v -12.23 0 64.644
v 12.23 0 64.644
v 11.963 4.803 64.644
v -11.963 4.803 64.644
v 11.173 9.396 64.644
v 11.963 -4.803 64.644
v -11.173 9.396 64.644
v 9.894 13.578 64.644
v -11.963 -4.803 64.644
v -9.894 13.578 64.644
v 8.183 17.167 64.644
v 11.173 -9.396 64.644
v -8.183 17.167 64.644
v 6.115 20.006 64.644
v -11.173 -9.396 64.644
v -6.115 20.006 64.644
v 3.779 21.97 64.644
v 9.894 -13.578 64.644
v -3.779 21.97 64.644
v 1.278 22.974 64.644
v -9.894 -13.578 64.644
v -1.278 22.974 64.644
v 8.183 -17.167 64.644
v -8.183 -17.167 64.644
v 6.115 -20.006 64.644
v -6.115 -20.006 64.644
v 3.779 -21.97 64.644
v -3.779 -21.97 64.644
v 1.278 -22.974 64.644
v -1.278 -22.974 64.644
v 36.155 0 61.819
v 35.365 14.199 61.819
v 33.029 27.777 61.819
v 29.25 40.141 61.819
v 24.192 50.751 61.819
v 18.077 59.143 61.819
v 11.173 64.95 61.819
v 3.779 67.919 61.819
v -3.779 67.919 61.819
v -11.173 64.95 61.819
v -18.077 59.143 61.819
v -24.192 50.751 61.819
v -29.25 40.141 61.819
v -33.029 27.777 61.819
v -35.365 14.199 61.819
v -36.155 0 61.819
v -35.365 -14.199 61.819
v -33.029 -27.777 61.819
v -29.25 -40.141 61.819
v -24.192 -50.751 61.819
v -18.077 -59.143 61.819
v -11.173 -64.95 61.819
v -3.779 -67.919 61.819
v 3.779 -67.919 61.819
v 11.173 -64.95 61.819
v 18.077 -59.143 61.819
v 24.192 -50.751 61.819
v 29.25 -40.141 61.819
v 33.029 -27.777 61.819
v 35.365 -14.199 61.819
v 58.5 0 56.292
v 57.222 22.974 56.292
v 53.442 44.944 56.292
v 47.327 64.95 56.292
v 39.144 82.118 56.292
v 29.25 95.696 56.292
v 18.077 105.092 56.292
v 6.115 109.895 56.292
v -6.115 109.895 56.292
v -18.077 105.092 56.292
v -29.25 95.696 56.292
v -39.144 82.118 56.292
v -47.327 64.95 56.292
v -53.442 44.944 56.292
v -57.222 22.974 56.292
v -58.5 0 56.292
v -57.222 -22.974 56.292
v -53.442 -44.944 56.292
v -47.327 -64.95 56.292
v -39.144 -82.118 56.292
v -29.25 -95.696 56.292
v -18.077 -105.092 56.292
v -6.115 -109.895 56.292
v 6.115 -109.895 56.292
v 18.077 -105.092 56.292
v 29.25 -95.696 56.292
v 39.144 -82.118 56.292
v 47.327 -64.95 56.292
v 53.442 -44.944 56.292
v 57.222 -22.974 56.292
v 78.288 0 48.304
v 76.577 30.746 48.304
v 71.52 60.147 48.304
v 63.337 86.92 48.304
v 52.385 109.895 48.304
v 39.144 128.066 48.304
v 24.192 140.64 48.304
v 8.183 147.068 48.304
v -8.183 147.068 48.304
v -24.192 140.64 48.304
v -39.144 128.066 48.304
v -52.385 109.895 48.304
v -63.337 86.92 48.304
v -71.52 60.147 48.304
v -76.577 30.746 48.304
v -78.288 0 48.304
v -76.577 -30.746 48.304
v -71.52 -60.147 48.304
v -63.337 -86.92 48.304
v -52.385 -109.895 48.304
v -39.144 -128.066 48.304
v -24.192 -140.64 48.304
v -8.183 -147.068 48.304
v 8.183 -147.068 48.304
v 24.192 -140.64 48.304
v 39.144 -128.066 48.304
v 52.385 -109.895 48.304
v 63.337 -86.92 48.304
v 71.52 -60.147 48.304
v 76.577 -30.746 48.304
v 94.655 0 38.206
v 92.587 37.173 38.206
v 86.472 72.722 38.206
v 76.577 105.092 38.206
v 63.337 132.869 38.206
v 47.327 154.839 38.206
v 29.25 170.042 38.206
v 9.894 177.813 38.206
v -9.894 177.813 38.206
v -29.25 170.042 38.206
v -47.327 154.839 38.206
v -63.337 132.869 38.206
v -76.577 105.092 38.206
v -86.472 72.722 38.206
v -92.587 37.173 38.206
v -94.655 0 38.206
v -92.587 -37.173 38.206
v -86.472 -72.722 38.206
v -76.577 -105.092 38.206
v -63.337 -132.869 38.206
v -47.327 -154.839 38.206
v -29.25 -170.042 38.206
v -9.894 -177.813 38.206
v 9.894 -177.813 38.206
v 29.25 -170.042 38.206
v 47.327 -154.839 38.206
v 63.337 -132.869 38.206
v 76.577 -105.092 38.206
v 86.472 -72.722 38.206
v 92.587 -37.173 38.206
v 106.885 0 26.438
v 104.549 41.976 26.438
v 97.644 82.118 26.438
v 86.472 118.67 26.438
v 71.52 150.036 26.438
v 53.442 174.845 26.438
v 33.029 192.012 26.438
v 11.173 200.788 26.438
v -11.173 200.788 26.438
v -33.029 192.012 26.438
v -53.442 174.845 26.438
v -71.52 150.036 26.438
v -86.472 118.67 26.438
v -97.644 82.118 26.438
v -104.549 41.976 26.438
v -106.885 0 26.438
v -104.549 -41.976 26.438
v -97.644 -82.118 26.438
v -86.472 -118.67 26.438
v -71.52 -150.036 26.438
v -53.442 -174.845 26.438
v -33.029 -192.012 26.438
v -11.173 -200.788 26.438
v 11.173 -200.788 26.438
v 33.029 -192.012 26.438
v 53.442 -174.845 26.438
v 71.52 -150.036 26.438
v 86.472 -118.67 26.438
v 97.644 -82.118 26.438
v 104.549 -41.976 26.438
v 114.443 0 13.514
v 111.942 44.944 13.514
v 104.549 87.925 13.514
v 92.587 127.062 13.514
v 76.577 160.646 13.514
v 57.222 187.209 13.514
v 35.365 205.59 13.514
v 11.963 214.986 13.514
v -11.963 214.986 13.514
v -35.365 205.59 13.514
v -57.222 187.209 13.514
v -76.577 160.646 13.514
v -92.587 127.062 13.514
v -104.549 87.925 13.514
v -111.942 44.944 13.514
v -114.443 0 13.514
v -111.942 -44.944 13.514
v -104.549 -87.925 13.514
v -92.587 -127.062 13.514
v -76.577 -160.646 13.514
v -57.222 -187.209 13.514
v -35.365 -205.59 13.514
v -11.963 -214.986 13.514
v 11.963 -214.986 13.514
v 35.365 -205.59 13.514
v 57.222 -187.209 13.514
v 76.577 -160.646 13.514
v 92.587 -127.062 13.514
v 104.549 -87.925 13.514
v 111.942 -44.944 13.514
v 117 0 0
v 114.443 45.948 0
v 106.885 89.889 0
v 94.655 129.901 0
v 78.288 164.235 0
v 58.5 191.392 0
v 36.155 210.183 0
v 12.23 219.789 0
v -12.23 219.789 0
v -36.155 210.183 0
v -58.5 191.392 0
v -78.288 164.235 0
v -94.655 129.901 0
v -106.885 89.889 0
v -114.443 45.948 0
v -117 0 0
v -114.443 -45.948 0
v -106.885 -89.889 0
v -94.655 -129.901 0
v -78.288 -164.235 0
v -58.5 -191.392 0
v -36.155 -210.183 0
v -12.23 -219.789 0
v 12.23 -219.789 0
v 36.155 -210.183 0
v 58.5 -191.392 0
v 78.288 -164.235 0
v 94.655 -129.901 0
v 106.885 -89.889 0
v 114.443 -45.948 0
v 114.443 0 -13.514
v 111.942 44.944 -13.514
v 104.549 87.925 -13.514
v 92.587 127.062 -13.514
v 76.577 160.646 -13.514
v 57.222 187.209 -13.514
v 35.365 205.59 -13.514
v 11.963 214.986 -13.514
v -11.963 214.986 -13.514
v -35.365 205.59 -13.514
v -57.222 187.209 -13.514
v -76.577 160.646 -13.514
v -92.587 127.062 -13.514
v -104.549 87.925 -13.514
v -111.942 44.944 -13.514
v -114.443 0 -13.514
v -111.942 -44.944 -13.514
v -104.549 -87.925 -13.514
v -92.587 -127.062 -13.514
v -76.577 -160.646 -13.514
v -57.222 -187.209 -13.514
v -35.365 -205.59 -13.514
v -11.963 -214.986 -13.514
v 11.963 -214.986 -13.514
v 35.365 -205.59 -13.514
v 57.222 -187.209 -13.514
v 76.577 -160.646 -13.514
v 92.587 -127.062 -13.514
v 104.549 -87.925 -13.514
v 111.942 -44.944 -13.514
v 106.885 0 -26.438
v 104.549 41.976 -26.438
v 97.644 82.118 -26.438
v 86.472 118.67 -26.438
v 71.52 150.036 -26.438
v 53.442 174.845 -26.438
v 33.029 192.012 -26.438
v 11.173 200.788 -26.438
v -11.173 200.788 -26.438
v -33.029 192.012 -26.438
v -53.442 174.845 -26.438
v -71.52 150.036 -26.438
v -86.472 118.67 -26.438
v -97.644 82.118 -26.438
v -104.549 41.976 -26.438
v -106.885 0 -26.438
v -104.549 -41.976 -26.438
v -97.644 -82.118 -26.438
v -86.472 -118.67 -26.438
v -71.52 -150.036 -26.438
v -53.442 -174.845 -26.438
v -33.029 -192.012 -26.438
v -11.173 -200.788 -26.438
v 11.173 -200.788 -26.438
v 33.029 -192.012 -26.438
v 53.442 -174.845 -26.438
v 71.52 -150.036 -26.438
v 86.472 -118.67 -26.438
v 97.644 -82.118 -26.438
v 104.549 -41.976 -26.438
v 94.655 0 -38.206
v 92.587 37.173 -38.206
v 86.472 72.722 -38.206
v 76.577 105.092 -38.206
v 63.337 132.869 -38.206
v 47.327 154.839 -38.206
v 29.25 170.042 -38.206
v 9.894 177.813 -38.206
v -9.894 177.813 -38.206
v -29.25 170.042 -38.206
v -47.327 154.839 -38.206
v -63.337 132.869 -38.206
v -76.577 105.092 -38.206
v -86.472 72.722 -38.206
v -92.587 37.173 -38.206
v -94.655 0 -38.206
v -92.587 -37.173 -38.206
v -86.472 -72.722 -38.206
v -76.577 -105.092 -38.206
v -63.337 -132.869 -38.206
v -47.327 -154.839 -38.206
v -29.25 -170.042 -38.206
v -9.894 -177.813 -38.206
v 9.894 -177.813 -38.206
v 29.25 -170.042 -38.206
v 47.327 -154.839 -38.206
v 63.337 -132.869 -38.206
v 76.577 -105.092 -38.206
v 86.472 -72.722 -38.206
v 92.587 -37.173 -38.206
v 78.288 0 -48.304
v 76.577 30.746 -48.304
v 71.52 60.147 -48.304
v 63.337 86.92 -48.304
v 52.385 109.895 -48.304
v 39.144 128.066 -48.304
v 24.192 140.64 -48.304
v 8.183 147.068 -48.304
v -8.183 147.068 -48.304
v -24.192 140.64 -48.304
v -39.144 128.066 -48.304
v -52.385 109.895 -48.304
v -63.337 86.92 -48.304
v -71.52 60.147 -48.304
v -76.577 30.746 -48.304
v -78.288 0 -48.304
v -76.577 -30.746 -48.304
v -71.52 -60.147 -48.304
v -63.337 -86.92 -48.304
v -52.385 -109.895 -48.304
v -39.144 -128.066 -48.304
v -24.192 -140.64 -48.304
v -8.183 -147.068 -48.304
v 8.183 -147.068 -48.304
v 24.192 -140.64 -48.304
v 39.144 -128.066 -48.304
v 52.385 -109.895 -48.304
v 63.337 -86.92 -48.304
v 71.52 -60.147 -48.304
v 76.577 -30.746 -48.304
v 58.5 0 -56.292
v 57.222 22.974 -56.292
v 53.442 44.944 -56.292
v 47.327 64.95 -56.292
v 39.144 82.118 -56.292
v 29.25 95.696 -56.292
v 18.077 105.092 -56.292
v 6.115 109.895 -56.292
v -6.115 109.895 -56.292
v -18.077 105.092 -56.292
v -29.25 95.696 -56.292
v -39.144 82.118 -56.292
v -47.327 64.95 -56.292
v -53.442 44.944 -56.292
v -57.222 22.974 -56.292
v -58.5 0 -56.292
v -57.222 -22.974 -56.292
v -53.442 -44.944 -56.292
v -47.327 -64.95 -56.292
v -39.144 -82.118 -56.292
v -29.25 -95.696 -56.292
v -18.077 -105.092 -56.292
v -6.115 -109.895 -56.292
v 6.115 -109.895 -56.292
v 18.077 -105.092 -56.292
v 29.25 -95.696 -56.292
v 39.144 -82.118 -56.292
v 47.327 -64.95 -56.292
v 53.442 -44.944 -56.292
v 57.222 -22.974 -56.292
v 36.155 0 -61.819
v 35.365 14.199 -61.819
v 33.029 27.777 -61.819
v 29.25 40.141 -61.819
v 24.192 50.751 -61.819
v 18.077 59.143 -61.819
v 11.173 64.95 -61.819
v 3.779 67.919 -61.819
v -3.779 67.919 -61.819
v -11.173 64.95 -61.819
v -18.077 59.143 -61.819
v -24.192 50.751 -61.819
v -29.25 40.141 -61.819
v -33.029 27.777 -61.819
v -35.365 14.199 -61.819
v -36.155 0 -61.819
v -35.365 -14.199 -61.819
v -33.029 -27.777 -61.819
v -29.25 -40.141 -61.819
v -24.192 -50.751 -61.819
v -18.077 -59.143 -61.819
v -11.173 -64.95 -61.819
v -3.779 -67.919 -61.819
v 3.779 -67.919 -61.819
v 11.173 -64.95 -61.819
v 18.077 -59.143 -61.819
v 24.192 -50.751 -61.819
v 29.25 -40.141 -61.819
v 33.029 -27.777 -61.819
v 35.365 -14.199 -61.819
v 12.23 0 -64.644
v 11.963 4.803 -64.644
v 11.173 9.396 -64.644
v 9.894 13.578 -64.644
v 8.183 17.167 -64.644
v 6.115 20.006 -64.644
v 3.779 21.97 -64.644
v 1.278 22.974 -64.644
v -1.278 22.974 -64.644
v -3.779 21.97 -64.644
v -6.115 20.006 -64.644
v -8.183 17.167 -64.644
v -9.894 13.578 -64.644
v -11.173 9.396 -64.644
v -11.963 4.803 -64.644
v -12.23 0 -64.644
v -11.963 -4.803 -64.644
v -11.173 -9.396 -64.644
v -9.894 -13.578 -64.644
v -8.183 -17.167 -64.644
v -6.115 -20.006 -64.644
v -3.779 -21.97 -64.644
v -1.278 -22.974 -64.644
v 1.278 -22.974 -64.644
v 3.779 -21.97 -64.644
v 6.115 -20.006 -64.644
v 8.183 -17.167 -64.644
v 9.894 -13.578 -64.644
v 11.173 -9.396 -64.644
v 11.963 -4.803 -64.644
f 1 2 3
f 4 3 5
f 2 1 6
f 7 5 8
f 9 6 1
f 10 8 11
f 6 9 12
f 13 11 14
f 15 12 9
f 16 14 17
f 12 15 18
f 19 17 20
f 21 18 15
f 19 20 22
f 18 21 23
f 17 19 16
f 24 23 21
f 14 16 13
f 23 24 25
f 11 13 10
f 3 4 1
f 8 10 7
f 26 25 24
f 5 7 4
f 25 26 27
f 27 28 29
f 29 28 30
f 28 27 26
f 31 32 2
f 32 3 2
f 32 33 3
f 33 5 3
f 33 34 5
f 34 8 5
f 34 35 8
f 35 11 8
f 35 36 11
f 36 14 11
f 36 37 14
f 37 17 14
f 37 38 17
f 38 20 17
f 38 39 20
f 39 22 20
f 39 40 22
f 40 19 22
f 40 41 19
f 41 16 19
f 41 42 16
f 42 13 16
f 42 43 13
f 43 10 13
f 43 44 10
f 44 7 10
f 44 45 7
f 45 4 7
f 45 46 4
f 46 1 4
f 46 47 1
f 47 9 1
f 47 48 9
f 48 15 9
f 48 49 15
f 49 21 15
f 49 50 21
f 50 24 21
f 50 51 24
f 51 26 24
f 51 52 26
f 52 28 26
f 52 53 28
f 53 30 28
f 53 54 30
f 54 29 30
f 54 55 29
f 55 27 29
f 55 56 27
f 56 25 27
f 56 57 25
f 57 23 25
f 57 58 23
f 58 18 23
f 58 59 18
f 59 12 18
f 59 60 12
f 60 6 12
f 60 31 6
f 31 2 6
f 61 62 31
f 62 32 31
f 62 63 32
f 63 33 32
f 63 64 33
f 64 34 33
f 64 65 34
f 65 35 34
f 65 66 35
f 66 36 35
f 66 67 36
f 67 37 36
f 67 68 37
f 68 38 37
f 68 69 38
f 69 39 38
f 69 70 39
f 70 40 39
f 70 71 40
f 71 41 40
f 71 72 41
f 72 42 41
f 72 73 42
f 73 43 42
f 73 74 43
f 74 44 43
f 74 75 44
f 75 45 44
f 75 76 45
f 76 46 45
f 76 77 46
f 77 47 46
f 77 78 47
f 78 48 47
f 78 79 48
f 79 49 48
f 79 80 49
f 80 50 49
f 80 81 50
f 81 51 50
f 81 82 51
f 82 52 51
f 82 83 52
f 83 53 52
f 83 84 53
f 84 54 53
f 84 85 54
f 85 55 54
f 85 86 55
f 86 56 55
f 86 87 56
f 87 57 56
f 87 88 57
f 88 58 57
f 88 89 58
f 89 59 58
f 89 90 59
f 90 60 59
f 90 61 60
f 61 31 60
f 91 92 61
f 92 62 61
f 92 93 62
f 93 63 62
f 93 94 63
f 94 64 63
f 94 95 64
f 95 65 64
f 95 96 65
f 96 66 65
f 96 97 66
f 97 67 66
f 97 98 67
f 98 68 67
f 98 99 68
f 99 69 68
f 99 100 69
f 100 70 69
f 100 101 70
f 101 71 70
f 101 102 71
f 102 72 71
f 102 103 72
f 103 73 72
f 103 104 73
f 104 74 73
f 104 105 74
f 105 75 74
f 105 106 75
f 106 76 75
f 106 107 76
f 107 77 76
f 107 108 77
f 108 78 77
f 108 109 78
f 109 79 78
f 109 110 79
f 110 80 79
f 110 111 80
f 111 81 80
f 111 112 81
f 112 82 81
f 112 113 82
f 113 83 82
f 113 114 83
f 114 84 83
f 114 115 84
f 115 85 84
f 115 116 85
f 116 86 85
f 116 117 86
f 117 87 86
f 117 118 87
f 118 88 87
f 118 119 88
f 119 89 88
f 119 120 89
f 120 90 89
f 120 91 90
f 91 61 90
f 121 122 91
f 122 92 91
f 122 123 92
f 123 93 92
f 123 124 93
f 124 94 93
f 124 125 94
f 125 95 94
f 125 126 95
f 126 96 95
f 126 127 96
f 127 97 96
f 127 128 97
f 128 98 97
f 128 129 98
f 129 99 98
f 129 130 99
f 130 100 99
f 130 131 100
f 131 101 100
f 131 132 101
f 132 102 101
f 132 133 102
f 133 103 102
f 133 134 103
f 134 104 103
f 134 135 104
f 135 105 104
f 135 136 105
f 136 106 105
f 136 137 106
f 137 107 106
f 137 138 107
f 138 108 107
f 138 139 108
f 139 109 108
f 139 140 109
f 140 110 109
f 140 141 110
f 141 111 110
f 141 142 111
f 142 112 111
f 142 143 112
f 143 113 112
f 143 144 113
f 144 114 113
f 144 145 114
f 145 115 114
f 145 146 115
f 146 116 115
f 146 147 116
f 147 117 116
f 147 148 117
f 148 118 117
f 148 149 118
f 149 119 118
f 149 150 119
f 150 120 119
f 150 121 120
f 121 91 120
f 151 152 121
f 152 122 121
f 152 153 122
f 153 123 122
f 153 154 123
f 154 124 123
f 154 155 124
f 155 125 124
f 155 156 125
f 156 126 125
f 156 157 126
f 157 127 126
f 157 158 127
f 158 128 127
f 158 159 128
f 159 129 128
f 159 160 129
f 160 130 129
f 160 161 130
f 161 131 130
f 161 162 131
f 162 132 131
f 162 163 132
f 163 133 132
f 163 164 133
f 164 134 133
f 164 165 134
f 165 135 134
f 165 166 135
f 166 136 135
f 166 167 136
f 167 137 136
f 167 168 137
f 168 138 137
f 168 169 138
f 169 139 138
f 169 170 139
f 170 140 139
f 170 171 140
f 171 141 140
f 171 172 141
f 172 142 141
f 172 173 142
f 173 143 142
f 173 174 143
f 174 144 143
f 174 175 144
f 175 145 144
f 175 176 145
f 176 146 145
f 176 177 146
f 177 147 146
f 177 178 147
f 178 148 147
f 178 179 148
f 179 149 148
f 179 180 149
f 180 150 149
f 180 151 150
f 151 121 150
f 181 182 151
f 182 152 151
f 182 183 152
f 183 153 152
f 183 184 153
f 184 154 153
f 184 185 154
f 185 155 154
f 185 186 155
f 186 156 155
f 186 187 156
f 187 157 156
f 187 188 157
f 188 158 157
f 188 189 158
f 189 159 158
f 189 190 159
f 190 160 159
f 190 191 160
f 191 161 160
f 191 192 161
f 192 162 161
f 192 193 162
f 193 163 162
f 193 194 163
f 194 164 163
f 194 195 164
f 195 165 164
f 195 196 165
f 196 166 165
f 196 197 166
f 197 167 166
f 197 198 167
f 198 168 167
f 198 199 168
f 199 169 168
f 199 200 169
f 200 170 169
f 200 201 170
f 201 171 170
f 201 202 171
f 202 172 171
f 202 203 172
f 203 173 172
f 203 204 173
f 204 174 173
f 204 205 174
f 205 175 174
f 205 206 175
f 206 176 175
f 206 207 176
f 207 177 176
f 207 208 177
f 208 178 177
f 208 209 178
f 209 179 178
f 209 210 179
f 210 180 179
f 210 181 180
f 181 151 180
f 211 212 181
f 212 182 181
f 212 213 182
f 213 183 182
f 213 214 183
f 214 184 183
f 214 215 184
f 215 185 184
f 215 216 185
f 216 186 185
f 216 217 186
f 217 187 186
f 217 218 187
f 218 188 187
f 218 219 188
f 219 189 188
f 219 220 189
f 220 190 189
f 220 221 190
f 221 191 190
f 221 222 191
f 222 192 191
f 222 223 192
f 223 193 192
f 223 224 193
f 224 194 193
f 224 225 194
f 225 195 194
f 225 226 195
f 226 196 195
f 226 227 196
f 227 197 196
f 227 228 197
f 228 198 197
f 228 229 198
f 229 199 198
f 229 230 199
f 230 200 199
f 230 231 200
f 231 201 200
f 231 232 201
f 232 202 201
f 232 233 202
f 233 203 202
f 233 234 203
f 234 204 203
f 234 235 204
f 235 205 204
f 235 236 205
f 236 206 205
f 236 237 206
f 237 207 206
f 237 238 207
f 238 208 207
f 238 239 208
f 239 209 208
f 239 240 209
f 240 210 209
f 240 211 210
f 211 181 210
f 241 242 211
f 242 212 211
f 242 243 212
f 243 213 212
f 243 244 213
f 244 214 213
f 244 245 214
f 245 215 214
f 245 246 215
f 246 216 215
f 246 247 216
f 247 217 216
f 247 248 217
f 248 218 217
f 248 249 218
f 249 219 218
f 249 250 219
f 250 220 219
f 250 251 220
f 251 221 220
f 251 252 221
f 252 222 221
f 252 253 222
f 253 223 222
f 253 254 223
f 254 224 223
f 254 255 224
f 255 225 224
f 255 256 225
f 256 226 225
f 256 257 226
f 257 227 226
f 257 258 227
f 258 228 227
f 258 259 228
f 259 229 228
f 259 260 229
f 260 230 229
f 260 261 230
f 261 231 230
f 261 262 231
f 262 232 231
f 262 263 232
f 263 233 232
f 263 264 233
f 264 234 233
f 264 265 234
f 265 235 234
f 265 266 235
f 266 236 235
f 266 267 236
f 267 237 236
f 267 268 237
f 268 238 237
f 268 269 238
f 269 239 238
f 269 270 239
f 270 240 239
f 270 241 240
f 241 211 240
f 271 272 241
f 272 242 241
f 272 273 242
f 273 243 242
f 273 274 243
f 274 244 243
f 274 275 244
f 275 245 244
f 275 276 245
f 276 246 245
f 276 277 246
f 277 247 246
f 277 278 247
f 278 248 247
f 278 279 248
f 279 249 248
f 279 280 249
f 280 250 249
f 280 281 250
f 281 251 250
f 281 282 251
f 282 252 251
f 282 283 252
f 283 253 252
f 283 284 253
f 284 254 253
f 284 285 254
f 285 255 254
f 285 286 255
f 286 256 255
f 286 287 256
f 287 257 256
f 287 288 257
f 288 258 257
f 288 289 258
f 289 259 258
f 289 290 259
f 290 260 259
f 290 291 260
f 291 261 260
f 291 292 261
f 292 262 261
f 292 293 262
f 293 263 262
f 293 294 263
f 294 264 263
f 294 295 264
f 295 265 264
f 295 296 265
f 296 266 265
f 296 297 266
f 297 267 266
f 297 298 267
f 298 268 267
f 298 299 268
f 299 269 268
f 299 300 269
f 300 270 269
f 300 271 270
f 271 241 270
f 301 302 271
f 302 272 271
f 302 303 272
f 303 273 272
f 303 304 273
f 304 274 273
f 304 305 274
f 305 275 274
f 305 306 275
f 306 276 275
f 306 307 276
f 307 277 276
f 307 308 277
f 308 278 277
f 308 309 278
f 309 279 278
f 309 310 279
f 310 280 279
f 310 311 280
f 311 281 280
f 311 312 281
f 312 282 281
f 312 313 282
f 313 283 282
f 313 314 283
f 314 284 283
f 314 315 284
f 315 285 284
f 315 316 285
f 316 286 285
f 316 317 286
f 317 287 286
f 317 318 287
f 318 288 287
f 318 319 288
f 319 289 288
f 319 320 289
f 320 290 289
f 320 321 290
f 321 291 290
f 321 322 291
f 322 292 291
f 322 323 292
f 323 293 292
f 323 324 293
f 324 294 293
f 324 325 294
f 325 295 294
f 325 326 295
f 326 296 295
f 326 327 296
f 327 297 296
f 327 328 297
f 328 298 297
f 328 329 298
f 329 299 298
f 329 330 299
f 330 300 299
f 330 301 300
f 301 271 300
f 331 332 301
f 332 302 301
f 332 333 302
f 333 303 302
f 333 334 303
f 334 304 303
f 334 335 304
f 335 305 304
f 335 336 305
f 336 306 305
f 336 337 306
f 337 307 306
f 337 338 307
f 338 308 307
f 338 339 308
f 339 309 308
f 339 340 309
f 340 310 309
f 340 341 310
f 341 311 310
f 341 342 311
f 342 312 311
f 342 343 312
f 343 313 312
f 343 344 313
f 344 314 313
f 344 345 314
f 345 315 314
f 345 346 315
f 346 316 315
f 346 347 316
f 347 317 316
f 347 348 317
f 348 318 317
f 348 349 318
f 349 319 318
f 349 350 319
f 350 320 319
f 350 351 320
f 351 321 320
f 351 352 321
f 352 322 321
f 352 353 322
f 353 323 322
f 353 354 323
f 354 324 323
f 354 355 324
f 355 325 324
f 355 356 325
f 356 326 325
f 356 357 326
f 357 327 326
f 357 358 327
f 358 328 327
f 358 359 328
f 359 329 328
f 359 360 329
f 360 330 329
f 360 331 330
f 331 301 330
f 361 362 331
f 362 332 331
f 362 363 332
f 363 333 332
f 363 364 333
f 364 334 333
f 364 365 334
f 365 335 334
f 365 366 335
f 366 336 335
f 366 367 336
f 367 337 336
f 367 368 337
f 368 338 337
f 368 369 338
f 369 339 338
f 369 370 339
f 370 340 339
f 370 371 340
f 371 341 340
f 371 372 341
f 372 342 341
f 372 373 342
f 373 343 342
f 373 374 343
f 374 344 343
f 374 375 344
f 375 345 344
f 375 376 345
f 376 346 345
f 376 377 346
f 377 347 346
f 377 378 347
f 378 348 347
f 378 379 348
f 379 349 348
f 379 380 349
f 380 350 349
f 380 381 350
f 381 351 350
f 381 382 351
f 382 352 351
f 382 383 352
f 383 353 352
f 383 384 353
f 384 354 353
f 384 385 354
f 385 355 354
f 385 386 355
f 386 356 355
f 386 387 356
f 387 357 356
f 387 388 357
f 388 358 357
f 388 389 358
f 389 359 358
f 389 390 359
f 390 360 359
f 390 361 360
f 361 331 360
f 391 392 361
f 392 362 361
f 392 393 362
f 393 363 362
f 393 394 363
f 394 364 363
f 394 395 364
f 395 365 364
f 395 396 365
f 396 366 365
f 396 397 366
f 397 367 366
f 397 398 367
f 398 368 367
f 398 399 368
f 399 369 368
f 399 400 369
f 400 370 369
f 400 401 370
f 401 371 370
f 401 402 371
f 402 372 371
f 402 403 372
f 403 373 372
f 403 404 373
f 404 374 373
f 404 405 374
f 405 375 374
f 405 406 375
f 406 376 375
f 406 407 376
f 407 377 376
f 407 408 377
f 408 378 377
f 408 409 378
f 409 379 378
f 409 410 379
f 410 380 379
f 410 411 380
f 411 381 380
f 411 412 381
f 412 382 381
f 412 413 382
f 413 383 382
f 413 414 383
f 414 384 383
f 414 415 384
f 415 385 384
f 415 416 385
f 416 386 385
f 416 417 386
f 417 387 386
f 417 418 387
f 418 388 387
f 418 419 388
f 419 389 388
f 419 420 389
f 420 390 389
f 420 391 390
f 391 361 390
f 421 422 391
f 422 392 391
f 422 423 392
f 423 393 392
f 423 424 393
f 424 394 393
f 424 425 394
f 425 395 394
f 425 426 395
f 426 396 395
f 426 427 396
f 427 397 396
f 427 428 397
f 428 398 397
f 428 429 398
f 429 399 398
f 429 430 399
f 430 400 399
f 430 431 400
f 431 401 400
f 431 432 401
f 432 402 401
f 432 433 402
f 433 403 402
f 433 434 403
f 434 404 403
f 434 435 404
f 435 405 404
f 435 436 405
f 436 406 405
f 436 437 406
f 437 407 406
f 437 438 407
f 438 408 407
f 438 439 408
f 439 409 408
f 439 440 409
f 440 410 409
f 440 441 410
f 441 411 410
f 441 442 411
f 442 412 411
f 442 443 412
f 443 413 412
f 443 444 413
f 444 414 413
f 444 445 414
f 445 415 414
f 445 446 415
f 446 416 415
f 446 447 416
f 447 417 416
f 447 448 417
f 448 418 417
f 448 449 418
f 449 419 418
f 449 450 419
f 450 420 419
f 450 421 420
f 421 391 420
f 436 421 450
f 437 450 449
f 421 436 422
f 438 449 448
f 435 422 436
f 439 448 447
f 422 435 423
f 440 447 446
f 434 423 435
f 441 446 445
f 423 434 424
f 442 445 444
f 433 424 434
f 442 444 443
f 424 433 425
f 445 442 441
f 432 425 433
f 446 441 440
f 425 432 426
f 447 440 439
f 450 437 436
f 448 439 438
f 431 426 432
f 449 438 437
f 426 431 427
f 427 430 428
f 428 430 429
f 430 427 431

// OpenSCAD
// Generated by SolidPython 1.0.1 on 2020-07-29 00:46:49


scale(v = [9, 17, 5]) {
	sphere(r = 13);
}
/***********************************************
*********      SolidPython code:      **********
************************************************
 
# import packages: SolidPython
from solid import *
from solid.utils import *
from itertools import chain, combinations, permutations


class Resize:

    def __init__(self, scad_file):
        self.scad_file = scad_file
        #self.scad_file = import_scad(scad_file)
        # cone/cylinder param:
        self.r1 = 0
        self.r2 = 0
        self.h = 0
        # rectangular prism param:
        self.w = 0
        self.l = 0
        # ellipse param:
        self.r = 0

    # import OpenScad code (file name corresponds to shape)


    # classify shape + parameters
    def assign(self, param1, param2, param3):
        if self.scad_file == 'cone.scad':
            self.r1 = param1
            self.r2 = param2
            self.h = param3
        elif self.scad_file == 'cylinder.scad':
            self.r1 = param1
            self.r2 = param2
            self.h = param3
        elif self.scad_file == 'rectangularPrism.scad':
            self.h = param1
            self.l = param2
            self.w = param3
        else:
            self.r = param1
            self.h = param2

    # resize parameters
    def iterate(self):
        x = range(3, 20, 2)
        i = 1
        if self.scad_file == 'cone.scad':
            tempList = list(permutations(x, 2))
            for temp in tempList:
                param1 = temp[0]
                param2 = temp[1]
                filepath = 'produced_scad_files/' + 'cone' + str(param1) + '_' + str(param2) + '_' + '.scad'
                scad_render_to_file(cylinder(h=param1, r1=param2, r2=0), filepath)

        elif self.scad_file == 'cylinder.scad':
            tempList = list(permutations(x, 3))
            for temp in tempList:
                param1 = temp[0]
                param2 = temp[1]
                filepath = 'produced_scad_files/' + 'cylinder' + str(param1) + '_' + str(param2) + '_' + '.scad'
                scad_render_to_file(cylinder(h=param1, r1=param2, r2=param2), filepath)

        elif self.scad_file == 'rectangularPrism.scad':
            tempList = list(permutations(x, 3))
            for temp in tempList:
                param1 = temp[0]
                param2 = temp[1]
                param3 = temp[2]
                filepath = 'produced_scad_files/' + 'rectangularPrism' + str(param1) + '_' + str(param2) + '_' + str(
                    param3) + '.scad'
                scad_render_to_file(cube(size=(param1, param2, param3)), filepath)

        elif self.scad_file == 'ellipse.scad':
            tempList = list(permutations(x, 4))
            for temp in tempList:
                param1 = temp[0]
                param2 = temp[1]
                param3 = temp[2]
                param4 = temp[3]
                filepath = 'produced_scad_files/' + 'ellipse' + str(param1) + '_' + str(param2) + '_' + str(param3) + '_' + str(param4) + '.scad'
                scad_render_to_file(scale([param1, param2, param3])(sphere(r=param4)), filepath)

    def render_to_scadfile(self):
        scad_render_to_file(scad, 'example.scad') 
 
************************************************/
